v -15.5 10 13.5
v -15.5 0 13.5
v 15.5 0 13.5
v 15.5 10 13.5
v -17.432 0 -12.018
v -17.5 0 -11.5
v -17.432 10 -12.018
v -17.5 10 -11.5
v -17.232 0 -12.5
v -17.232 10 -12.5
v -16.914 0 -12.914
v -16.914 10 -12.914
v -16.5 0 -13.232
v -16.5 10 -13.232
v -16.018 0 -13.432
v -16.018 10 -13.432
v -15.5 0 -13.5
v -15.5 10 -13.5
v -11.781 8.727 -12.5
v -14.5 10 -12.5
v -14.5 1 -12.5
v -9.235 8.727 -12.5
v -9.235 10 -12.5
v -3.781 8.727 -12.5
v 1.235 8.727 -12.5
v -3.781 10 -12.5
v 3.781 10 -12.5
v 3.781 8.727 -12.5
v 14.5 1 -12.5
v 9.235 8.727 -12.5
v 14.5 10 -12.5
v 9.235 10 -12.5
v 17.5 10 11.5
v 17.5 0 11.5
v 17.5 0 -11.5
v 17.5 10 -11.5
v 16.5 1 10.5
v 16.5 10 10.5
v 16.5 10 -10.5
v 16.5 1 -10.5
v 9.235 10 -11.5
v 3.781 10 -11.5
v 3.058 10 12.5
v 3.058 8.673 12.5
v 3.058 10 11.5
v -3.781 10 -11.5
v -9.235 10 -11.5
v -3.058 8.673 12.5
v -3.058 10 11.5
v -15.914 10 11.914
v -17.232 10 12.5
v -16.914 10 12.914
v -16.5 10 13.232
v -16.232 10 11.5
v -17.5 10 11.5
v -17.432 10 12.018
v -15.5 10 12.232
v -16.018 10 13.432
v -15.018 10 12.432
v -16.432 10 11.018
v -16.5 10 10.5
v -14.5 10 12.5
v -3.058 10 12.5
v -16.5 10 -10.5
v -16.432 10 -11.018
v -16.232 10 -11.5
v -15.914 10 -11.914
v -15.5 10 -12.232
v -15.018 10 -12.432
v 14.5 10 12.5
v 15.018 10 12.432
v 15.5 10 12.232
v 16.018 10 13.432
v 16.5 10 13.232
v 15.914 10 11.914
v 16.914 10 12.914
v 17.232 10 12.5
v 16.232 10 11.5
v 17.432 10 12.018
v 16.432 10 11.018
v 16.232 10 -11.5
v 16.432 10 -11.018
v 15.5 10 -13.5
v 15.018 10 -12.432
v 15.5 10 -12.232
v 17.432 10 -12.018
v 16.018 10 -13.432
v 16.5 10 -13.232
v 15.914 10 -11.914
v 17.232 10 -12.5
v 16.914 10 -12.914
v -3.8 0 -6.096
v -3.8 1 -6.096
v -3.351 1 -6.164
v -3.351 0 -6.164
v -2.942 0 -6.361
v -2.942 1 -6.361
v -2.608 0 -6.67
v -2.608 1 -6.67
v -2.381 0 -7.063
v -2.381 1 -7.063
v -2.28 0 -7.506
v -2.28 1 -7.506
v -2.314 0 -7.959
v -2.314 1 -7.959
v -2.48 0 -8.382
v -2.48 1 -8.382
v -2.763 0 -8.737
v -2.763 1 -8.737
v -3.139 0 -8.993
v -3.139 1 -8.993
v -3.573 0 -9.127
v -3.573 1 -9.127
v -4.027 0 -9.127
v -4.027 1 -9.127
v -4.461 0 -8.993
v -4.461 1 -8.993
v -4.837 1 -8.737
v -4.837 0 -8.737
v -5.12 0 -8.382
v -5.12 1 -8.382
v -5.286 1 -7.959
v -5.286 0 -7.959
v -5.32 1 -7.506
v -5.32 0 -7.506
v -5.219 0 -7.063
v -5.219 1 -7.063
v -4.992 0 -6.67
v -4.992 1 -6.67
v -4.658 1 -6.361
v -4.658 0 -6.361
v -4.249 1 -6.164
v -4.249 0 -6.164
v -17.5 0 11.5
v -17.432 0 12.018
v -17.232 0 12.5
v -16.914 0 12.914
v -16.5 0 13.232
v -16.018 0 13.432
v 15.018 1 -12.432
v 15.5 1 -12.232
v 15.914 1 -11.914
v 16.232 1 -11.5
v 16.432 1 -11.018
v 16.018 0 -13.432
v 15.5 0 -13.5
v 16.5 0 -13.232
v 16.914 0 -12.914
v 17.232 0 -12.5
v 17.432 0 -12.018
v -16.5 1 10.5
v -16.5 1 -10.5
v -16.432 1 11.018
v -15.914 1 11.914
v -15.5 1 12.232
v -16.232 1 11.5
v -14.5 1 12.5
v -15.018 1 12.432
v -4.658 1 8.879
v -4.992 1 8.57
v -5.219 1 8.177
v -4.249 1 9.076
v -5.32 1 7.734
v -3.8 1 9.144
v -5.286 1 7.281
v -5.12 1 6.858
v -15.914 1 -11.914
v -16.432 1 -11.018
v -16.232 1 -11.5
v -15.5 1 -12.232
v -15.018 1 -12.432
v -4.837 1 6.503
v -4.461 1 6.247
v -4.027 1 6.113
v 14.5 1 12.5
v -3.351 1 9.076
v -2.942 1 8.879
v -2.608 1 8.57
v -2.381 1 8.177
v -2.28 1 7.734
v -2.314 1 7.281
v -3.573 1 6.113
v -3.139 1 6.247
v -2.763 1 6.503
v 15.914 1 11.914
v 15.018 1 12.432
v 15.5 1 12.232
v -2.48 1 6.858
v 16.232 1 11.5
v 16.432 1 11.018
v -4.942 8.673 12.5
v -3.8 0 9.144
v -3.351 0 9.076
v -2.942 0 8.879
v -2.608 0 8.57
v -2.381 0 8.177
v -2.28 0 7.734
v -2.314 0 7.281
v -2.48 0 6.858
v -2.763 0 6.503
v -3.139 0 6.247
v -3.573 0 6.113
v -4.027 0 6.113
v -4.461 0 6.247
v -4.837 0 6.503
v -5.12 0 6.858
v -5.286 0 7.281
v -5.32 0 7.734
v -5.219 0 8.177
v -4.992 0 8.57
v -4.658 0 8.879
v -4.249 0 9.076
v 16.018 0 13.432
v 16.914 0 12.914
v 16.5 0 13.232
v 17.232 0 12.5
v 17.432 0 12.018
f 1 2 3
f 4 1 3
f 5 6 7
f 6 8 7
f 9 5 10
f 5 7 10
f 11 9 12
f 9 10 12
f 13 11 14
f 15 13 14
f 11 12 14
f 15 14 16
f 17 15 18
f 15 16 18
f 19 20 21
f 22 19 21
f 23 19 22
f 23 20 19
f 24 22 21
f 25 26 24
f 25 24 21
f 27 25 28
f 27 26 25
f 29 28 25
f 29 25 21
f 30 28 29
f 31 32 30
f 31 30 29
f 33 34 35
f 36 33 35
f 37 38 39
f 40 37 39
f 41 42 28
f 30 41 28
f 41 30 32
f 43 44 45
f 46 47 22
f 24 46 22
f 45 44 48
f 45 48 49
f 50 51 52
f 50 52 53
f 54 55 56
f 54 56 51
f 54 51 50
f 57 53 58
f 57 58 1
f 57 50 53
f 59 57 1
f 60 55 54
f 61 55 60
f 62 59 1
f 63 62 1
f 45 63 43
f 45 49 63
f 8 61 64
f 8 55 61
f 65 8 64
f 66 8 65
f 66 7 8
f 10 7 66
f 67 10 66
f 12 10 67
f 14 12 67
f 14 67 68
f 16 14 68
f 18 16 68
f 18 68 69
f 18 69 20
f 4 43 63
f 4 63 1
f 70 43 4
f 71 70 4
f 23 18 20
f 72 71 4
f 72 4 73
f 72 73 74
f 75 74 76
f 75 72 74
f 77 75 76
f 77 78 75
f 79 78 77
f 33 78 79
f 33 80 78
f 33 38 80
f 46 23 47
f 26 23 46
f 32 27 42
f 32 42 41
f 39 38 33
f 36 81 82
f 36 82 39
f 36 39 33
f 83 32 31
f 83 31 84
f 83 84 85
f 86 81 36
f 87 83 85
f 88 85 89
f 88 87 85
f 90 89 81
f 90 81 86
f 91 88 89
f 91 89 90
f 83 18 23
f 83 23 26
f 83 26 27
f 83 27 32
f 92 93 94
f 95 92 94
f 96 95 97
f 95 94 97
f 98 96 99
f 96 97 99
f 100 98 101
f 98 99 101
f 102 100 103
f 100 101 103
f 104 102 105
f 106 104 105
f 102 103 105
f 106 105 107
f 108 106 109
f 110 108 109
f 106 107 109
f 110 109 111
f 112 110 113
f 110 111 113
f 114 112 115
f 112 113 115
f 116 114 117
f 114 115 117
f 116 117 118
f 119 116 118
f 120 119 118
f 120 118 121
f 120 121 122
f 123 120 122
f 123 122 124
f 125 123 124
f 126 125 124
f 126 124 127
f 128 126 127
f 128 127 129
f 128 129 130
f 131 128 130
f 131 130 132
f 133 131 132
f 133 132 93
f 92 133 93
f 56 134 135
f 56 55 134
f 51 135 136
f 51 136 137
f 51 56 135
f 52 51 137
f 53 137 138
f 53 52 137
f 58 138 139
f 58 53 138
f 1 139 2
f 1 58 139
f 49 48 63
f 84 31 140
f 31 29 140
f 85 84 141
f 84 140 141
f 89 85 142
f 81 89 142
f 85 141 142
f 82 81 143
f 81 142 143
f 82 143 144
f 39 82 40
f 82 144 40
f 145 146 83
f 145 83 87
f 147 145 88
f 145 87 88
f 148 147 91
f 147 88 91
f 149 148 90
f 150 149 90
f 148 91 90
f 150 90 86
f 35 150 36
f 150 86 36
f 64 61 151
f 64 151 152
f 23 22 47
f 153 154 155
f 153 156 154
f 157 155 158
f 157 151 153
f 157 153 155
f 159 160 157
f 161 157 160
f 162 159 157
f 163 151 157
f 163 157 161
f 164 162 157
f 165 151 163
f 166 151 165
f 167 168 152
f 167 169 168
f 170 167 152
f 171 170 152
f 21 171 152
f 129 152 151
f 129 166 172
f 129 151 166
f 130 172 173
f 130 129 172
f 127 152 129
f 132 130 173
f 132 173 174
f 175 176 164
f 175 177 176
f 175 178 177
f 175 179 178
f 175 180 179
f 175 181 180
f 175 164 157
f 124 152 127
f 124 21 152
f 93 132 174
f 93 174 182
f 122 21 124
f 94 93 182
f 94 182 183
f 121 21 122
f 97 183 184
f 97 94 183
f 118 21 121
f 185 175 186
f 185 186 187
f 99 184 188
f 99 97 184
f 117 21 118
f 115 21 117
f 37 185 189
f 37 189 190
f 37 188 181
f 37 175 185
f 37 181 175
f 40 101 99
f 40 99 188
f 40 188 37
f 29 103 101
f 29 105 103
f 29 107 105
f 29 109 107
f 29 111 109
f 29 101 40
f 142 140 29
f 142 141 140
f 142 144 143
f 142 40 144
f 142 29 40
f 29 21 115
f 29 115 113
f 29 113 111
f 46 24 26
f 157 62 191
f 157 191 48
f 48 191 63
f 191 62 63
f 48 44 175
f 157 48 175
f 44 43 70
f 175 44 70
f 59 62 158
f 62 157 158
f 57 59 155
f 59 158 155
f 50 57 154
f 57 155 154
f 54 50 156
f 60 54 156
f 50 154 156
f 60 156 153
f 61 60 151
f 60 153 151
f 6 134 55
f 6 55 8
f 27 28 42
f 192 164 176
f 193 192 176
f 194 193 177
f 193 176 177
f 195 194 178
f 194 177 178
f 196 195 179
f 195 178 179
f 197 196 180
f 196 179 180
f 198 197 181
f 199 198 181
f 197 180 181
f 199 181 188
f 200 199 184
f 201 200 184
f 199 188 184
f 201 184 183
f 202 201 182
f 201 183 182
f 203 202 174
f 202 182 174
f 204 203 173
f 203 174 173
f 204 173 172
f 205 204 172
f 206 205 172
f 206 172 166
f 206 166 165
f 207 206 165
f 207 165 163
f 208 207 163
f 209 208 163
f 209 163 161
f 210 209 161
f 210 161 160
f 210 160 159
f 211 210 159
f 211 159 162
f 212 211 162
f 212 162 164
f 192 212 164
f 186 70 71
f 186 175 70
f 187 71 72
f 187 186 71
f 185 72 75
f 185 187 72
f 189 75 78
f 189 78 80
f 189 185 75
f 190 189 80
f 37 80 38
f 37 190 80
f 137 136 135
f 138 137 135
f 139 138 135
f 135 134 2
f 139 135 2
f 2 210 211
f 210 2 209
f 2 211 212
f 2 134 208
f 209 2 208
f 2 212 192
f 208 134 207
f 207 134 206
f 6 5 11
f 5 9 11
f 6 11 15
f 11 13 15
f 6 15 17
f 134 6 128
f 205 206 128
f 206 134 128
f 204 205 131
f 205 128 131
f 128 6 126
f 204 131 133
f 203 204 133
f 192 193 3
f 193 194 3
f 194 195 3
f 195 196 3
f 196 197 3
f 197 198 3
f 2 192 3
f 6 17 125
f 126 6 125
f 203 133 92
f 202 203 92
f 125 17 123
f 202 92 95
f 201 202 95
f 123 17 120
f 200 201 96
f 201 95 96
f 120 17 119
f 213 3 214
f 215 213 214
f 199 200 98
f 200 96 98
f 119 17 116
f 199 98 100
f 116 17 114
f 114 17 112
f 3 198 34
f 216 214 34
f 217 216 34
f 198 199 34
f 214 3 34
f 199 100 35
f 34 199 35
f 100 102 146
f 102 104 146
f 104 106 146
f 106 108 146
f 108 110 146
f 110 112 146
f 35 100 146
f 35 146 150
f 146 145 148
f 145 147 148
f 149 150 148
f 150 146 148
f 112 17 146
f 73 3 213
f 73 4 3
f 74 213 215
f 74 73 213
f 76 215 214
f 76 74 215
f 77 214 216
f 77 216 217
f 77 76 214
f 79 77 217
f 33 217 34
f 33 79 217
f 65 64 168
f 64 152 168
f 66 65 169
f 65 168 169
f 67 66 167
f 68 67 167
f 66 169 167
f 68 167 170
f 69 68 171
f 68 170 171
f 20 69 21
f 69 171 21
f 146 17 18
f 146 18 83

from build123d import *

# Parameters (mm, degrees)
SKETCH1_W           = 35
SKETCH1_H           = 27
BOSS_EXTRUDE1_DEPTH = 10
SKETCH2_W           = 33
SKETCH2_H           = 25
CUT_EXTRUDE1_DEPTH  = 9
SKETCH3_W           = 5.453863721
SKETCH3_H           = 1.273193124
BOSS_EXTRUDE2_DEPTH = 1
SKETCH4_W           = 6.116939674
SKETCH4_H           = 1.326628088
BOSS_EXTRUDE5_DEPTH = 1
CUT_EXTRUDE2_DEPTH  = 8
CUT_EXTRUDE5_DEPTH  = 8
CUT_EXTRUDE6_DEPTH  = 8
FILLET1_R           = 2
FILLET2_R           = 2
SKETCH8_R           = 1.524
CUT_EXTRUDE7_DEPTH  = 8


with BuildPart() as part:
    # Sketch1 → Boss-Extrude1 (new body)
    with BuildSketch(Plane(origin=(0, 0, 0), x_dir=(1, 0, 0), z_dir=(0, 1, 0))):
        Rectangle(SKETCH1_W, SKETCH1_H)
    extrude(amount=BOSS_EXTRUDE1_DEPTH)

    # Sketch2 → Cut-Extrude1 (cut)
    with BuildSketch(Plane(origin=(0, 10, 0), x_dir=(1, 0, 0), z_dir=(0, 1, 0))):
        Rectangle(SKETCH2_W, SKETCH2_H)
    extrude(amount=-CUT_EXTRUDE1_DEPTH, mode=Mode.SUBTRACT)

    # Sketch3 → Boss-Extrude2 (add)
    with BuildSketch(Plane.XY.offset(-12.5)):
        with Locations((6.508277375, 9.363403438)):
            Rectangle(SKETCH3_W, SKETCH3_H)
        with Locations((-6.508277375, 9.363403438)):
            Rectangle(SKETCH3_W, SKETCH3_H)
    extrude(amount=BOSS_EXTRUDE2_DEPTH)

    # Sketch4 → Boss-Extrude5 (add)
    with BuildSketch(Plane(origin=(0, 0, 12.5), x_dir=(-1, 0, 0), z_dir=(0, 0, -1))):
        with Locations((0, 9.336685956)):
            Rectangle(SKETCH4_W, SKETCH4_H)
    extrude(amount=BOSS_EXTRUDE5_DEPTH)

    # Sketch5 → Cut-Extrude2 (cut)
    with BuildSketch(Plane(origin=(3.058469837, 0, 0), x_dir=(0, 0, -1), z_dir=(1, 0, 0))):
        Polygon((-12.5, 8.673371912), (-11.5, 10), (-11.5, 8.673371912), align=None)
    extrude(amount=-CUT_EXTRUDE2_DEPTH, mode=Mode.SUBTRACT)

    # Sketch6 → Cut-Extrude5 (cut)
    with BuildSketch(Plane(origin=(9.235209235, 0, 0), x_dir=(0, 0, -1), z_dir=(1, 0, 0))):
        Polygon((11.5, 10), (12.5, 8.726806876), (11.5, 8.726806876), align=None)
    extrude(amount=-CUT_EXTRUDE5_DEPTH, mode=Mode.SUBTRACT)

    # Sketch7 → Cut-Extrude6 (cut)
    with BuildSketch(Plane(origin=(-3.781345514, 0, 0), x_dir=(0, 0, -1), z_dir=(1, 0, 0))):
        Polygon((11.5, 10), (12.5, 8.726806876), (11.5, 8.726806876), align=None)
    extrude(amount=-CUT_EXTRUDE6_DEPTH, mode=Mode.SUBTRACT)

    # Fillet1
    fillet1_edges = [part.edges().sort_by_distance(p)[0] for p in [
        (-17.5, 5, -13.5),
        (17.5, 5, -13.5),
        (17.5, 5, 13.5),
        (-17.5, 5, 13.5),
    ]]
    fillet(fillet1_edges, radius=FILLET1_R)

    # Fillet2
    fillet2_edges = [part.edges().sort_by_distance(p)[0] for p in [
        (-16.5, 5.5, 12.5),
        (-16.5, 5.5, -12.5),
        (16.5, 5.5, -12.5),
        (16.5, 5.5, 12.5),
    ]]
    fillet(fillet2_edges, radius=FILLET2_R)

    # Sketch8 → Cut-Extrude7 (cut)
    with BuildSketch(Plane(origin=(0, 1, 0), x_dir=(1, 0, 0), z_dir=(0, 1, 0))):
        with Locations(Location((-3.8, -7.62, 0), (0, 0, 270))):
            Circle(SKETCH8_R)
        with Locations(Location((-3.8, 7.62, 0), (0, 0, 270))):
            Circle(SKETCH8_R)
    extrude(amount=-CUT_EXTRUDE7_DEPTH, mode=Mode.SUBTRACT)


solid = part.part
